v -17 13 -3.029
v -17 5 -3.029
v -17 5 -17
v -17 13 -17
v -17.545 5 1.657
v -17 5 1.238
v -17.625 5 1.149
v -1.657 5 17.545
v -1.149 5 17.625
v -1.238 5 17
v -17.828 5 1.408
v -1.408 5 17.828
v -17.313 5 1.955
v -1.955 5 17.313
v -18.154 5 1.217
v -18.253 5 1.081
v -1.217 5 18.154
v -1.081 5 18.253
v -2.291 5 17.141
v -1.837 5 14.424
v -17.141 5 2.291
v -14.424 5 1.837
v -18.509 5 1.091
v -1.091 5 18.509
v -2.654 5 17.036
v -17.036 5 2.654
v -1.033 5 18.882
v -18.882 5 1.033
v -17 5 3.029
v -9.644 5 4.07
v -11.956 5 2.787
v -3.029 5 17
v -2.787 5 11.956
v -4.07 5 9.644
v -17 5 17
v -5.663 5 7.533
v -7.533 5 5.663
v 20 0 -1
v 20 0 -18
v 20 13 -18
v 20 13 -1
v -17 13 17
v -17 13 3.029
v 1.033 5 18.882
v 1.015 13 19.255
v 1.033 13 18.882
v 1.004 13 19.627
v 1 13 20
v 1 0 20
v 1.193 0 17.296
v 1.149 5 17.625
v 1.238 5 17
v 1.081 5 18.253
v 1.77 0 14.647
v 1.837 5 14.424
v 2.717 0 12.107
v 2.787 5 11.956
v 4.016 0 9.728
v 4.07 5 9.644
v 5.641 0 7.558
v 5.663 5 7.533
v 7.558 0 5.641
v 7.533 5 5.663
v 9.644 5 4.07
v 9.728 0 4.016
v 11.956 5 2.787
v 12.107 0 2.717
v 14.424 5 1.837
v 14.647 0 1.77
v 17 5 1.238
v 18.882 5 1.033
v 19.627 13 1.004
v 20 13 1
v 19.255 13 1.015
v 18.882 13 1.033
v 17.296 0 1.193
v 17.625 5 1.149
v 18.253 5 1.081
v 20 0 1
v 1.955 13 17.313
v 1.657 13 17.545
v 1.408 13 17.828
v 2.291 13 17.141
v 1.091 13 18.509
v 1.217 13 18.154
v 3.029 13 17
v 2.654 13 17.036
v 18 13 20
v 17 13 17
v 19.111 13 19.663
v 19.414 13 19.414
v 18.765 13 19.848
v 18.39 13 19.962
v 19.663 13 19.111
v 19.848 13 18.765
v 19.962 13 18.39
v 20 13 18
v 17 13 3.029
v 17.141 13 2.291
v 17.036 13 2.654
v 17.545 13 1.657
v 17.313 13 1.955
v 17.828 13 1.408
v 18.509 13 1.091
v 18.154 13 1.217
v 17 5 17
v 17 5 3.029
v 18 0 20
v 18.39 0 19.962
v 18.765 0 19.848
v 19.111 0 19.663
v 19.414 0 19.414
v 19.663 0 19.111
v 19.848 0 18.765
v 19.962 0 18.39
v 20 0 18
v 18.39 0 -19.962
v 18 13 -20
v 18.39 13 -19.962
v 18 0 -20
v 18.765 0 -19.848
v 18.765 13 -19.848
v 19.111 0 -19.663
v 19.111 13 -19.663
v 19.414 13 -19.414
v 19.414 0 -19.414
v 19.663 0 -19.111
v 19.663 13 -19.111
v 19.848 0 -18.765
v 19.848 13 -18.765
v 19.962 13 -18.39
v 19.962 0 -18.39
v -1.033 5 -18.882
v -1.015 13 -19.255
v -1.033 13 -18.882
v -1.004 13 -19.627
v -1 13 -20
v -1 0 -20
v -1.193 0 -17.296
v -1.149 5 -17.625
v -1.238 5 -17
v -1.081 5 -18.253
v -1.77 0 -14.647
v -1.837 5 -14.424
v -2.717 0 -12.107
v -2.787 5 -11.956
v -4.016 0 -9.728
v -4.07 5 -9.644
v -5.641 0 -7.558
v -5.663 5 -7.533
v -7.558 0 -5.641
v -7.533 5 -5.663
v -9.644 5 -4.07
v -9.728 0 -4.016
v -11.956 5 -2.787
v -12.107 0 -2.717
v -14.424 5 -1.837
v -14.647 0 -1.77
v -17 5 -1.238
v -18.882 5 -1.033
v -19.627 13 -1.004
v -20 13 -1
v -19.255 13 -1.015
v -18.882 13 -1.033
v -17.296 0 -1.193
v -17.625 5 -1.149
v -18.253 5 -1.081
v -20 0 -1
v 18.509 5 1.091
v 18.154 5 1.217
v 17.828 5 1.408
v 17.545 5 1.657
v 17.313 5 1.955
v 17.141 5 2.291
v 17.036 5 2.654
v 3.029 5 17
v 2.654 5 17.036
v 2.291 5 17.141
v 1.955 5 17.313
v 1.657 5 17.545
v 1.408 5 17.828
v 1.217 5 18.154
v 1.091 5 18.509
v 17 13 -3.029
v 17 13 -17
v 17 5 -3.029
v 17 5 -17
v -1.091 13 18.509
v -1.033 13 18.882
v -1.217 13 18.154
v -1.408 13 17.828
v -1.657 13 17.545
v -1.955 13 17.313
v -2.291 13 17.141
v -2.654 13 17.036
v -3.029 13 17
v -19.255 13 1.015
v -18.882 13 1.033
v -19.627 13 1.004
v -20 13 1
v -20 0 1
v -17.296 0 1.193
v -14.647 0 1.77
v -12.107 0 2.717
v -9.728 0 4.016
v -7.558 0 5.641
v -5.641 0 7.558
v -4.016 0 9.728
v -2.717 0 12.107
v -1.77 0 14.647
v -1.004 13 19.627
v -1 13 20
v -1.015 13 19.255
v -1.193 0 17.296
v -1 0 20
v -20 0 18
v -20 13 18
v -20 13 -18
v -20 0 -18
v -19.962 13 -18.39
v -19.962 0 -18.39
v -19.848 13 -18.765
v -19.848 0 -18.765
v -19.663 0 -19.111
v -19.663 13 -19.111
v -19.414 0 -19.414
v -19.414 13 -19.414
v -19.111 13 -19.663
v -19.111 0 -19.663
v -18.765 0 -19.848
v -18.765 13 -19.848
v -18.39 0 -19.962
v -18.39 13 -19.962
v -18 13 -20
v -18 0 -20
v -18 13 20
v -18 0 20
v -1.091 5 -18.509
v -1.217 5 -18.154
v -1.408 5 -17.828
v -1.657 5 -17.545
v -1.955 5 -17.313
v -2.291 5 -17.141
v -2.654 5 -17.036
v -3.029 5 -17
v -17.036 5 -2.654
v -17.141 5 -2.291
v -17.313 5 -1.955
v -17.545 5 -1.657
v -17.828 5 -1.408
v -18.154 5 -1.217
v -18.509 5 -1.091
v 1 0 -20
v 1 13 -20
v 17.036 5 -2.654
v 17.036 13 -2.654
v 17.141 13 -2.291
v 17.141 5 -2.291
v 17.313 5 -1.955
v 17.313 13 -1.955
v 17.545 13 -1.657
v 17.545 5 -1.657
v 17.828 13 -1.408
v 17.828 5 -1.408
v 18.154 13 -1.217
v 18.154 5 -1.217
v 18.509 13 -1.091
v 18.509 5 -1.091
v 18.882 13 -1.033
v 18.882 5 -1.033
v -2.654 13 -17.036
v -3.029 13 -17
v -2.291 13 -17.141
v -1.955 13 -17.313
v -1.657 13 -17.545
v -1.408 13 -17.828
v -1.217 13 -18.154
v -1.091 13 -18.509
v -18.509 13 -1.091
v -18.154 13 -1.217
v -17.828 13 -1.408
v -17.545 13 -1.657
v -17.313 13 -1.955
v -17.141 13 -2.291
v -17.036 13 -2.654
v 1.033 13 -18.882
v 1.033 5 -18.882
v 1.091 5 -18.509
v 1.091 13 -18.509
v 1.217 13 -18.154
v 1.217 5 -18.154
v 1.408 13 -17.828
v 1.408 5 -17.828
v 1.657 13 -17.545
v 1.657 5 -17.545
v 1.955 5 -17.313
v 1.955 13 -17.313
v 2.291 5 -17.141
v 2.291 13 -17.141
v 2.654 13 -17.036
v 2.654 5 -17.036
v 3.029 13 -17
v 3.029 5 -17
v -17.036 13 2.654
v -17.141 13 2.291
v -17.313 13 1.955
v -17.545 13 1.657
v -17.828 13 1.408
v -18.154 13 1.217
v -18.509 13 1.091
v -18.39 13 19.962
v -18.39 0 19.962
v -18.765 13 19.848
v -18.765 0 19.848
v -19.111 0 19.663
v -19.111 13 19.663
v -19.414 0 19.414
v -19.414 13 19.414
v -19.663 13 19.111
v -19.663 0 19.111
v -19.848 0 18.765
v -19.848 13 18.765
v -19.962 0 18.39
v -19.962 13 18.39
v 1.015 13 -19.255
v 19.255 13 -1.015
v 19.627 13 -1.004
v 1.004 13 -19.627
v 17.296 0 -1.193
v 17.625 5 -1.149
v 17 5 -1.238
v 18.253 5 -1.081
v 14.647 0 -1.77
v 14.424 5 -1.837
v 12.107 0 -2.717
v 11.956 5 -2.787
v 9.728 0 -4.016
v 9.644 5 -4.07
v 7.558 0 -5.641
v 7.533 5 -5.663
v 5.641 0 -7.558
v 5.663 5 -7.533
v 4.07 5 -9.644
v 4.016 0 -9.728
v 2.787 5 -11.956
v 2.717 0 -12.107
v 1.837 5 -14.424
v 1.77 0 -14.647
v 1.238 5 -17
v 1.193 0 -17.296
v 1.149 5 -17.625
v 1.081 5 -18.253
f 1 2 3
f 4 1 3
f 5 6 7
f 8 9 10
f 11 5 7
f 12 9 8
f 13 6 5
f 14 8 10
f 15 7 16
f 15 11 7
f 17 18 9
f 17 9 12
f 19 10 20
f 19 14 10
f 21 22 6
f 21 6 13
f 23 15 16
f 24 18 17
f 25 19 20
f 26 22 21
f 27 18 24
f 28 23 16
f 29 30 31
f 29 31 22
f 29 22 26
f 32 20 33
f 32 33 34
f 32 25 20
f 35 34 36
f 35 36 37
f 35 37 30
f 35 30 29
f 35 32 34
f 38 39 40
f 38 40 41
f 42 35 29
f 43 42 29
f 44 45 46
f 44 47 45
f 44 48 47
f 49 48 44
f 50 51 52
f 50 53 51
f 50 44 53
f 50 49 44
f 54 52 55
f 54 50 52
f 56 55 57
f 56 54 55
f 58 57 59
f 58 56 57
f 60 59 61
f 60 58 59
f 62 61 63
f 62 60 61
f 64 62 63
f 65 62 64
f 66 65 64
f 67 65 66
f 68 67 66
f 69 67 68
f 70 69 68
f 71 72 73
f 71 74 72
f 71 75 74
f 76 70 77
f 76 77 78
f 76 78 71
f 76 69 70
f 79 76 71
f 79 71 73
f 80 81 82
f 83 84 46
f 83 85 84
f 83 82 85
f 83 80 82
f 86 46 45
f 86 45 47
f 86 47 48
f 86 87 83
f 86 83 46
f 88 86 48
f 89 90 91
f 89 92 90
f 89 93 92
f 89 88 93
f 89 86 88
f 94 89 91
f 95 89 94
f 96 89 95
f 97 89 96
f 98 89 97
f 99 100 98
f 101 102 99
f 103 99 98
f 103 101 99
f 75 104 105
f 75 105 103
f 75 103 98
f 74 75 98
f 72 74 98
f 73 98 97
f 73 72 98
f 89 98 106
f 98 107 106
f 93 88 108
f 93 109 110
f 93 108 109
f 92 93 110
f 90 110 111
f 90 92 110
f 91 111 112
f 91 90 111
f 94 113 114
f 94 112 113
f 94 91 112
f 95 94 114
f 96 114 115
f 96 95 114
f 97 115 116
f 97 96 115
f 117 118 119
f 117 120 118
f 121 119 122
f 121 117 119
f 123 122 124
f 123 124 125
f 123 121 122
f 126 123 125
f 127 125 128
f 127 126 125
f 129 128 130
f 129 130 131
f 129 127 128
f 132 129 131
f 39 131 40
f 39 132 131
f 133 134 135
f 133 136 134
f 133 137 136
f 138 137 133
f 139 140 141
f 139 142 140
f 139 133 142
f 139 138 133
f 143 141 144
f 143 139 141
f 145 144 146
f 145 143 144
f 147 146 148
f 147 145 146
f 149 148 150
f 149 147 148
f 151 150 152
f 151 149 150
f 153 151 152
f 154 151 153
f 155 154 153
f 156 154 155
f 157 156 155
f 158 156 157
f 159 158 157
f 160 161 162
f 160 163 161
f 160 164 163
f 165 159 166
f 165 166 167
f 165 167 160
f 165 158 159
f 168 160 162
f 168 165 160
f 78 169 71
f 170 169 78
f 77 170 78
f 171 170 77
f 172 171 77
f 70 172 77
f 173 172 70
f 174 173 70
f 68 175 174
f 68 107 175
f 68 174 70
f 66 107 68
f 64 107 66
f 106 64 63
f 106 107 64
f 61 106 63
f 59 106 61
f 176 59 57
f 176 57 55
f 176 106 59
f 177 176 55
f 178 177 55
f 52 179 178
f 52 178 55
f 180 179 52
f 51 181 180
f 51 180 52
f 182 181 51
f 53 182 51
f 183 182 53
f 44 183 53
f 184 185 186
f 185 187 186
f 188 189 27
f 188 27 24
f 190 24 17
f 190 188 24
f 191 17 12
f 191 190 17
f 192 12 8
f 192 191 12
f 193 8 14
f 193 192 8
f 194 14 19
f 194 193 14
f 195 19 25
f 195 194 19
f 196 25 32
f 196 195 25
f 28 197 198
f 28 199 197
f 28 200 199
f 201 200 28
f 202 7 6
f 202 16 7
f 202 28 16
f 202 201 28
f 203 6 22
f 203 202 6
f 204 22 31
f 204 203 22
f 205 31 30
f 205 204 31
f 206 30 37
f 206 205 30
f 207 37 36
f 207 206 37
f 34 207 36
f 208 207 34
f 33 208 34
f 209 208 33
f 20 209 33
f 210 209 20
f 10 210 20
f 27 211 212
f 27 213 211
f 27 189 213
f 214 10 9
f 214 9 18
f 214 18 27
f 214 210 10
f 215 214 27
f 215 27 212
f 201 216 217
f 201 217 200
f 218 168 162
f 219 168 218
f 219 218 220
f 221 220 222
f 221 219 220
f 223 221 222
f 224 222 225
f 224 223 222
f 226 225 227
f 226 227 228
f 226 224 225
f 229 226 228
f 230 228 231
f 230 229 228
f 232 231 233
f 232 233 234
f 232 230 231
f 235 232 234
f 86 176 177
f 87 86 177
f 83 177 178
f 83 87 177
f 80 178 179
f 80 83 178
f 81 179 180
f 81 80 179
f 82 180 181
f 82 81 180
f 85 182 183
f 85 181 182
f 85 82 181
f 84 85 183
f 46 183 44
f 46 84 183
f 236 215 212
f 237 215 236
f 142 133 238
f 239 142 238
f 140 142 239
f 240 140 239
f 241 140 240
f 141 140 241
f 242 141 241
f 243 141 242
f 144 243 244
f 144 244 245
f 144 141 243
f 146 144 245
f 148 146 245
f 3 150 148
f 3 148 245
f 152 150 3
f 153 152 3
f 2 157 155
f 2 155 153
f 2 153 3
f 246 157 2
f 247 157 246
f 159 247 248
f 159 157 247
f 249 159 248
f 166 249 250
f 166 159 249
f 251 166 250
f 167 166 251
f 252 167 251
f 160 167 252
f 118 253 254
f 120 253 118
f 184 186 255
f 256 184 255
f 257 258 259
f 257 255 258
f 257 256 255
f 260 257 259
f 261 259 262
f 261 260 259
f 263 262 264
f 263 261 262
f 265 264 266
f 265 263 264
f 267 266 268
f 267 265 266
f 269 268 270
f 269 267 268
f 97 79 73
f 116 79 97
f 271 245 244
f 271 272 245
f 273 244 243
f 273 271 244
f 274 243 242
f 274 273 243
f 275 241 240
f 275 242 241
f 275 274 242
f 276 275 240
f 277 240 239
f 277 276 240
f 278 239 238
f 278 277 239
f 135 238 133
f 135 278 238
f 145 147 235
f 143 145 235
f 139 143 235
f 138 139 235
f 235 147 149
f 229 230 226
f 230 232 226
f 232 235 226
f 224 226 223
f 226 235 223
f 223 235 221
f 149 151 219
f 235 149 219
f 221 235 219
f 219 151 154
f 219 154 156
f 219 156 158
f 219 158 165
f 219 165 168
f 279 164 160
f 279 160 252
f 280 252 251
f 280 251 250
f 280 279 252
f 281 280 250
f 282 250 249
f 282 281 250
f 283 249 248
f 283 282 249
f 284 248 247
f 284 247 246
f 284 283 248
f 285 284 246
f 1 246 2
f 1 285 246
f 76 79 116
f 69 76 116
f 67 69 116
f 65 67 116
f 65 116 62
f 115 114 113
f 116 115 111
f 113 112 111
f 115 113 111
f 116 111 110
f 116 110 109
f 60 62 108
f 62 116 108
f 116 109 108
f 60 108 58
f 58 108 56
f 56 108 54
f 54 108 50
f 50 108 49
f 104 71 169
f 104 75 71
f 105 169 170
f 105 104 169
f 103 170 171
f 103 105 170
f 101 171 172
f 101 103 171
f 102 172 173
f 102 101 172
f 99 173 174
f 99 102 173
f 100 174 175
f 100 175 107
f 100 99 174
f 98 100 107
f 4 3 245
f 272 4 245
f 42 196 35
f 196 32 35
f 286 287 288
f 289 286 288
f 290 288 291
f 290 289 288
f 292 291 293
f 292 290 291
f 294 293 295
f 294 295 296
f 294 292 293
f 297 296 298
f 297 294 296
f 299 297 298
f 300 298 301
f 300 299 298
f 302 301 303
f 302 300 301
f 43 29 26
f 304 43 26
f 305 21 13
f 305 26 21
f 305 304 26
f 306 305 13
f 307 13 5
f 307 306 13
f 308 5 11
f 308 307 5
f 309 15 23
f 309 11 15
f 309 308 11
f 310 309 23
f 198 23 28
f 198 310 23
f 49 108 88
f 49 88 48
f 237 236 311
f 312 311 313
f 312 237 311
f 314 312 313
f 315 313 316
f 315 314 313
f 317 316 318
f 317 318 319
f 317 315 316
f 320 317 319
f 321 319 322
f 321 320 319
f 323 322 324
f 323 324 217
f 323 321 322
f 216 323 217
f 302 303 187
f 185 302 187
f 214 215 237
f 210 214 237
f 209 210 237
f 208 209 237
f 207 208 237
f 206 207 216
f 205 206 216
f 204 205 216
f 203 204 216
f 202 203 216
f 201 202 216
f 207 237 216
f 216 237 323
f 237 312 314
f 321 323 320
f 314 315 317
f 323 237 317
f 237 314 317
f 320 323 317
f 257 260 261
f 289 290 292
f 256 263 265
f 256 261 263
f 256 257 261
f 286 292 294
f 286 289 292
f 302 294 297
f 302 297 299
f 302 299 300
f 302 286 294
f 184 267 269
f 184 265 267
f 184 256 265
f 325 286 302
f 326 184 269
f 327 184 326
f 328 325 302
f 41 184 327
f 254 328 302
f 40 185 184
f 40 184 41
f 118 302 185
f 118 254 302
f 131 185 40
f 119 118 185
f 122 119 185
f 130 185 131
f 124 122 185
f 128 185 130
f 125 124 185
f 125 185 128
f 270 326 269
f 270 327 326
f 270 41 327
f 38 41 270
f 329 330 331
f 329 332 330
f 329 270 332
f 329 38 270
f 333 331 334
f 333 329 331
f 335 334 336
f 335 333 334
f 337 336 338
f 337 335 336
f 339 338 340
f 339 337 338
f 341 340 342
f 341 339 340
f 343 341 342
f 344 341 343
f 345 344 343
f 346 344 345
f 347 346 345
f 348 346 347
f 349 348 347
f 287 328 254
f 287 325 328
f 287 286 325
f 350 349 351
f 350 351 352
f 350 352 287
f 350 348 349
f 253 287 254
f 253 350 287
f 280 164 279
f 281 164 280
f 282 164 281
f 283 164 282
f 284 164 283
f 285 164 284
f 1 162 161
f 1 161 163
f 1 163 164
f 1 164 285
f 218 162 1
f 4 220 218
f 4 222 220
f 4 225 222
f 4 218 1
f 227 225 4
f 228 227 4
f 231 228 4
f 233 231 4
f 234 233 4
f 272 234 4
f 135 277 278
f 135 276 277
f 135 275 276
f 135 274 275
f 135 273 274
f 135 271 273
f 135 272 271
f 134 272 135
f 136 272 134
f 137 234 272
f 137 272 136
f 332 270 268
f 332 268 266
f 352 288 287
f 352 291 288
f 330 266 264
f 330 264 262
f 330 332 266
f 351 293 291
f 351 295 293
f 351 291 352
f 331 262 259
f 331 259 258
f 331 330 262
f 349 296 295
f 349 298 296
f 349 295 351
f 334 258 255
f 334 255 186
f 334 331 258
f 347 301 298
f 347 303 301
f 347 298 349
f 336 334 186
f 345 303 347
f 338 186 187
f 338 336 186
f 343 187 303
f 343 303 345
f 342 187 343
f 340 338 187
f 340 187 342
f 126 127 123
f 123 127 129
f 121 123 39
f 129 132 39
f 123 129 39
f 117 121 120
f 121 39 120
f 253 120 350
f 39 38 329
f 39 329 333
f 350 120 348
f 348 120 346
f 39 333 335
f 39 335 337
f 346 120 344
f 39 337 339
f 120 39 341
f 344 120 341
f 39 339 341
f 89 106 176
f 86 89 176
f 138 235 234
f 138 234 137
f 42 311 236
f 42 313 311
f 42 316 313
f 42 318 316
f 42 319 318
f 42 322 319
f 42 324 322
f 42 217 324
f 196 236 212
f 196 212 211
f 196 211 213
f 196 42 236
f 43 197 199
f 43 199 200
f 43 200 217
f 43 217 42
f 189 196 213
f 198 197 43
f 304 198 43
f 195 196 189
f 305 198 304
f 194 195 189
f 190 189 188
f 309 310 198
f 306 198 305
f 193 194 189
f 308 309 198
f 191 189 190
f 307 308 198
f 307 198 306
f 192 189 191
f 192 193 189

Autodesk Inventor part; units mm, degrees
ref_plane "YZ Plane" through (0, 0, 0) normal (1, 0, 0) x (0, 1, 0)
ref_plane "XZ Plane" through (0, 0, 0) normal (0, 1, 0) x (-1, 0, 0)
ref_plane "XY Plane" through (0, 0, 0) normal (0, 0, 1) x (1, 0, 0)
sketch "Sketch1" plane through (0, 0, 0) normal (0, 1, 0) x (-1, 0, 0)
  line L0 (-20, 20) -> (20, 20)
  line L1 (20, 20) -> (20, -20)
  line L2 (20, -20) -> (-20, -20)
  line L3 (-20, -20) -> (-20, 20)
  line L4 (-20, 20) -> (20, -20) construction
  line L5 (20, 20) -> (-20, -20) construction
  arc A0 (1, 20) -> (20, 1) centre (20, 20) ccw
  line L6 (20, 20) -> (1, 20) construction
  line L7 (20, 20) -> (20, 1) construction
  arc A1 (-1, -20) -> (-20, -1) centre (-20, -20) ccw
  arc A2 (-20, 1) -> (-1, 20) centre (-20, 20) ccw
  arc A3 (20, -1) -> (1, -20) centre (20, -20) ccw
  point P0 (0, 0)
  point P1 (-1, -20)
  point P2 (-20, -1)
  point P3 (20, -1)
  point P4 (1, -20)
  point P5 (-20, 1)
  point P6 (-1, 20)
  point P7 (1, 20)
  dimension "d0" = 40
  dimension "d1" = 40
  dimension "d2" = 90
  dimension "d3" = 1
  dimension "d6" = 90
extrude "Extrusion1" add sketch "Sketch1" along normal blind 5 contours L0 A2 L3 | L0 L1 A0 | A1 L2 L3 | L1 L2 A3
sketch "Sketch2" plane through (0, 5, 0) normal (0, 1, 0) x (1, 0, 0)
  line L0 (-20, -1) -> (-20, -20) projected
  line L1 (20, 1) -> (20, 20) projected
  line L2 (-20, 20) -> (-20, -20)
  arc A0 (-1, -20) -> (-20, -1) centre (-20, -20) ccw projected
  arc A1 (-1, -20) -> (-20, -1) centre (-20, -20) ccw
  arc A2 (20, -1) -> (1, -20) centre (20, -20) ccw
  arc A3 (1, 20) -> (20, 1) centre (20, 20) ccw
  arc A4 (-20, 1) -> (-1, 20) centre (-20, 20) ccw
  line L3 (17, -17) -> (1.2383, -17)
  line L4 (-1.2383, -17) -> (-17, -17)
  line L5 (-20, -20) -> (-1, -20)
  line L6 (1, -20) -> (20, -20)
  line L7 (-17, -17) -> (-17, -1.2383)
  line L8 (-17, 1.2383) -> (-17, 17)
  line L9 (-17, 17) -> (-1.2383, 17)
  line L10 (1.2383, 17) -> (17, 17)
  line L11 (20, 20) -> (1, 20)
  line L12 (-1, 20) -> (-20, 20)
  line L13 (17, 17) -> (17, 1.2383)
  line L14 (17, -1.2383) -> (17, -17)
  line L15 (20, -20) -> (20, -1)
  line L16 (20, 1) -> (20, 20)
  point P0 (0, 0)
  point P1 (-20, 1)
  dimension "d13" = 360
extrude "Extrusion2" add sketch "Sketch2" along normal blind 8 contours A0 L7 L4 L5 L0 | L2 L12 A4 L9 L8 | A3 L13 L10 L11 L1 | L15 L6 A2 L3 L14
fillet "Fillet1" radius 2 4 edges at (-17, 9, 1.2383) (-17, 9, -1.2383) (-1.2383, 9, 17) (-1.2383, 9, -17)
fillet "Fillet2" radius 2 2 edges at (1.2383, 9, -17) (17, 9, -1.2383)
fillet "Fillet3" radius 2 2 edges at (1.2383, 9, 17) (17, 9, 1.2383)
fillet "Fillet4" radius 2 3 edges at (-20, 6.5, 20) (20, 6.5, 20) (-20, 6.5, -20)
fillet "Fillet5" radius 2 1 edges at (20, 6.5, -20)
properties part number "cnc_wood_holder"
